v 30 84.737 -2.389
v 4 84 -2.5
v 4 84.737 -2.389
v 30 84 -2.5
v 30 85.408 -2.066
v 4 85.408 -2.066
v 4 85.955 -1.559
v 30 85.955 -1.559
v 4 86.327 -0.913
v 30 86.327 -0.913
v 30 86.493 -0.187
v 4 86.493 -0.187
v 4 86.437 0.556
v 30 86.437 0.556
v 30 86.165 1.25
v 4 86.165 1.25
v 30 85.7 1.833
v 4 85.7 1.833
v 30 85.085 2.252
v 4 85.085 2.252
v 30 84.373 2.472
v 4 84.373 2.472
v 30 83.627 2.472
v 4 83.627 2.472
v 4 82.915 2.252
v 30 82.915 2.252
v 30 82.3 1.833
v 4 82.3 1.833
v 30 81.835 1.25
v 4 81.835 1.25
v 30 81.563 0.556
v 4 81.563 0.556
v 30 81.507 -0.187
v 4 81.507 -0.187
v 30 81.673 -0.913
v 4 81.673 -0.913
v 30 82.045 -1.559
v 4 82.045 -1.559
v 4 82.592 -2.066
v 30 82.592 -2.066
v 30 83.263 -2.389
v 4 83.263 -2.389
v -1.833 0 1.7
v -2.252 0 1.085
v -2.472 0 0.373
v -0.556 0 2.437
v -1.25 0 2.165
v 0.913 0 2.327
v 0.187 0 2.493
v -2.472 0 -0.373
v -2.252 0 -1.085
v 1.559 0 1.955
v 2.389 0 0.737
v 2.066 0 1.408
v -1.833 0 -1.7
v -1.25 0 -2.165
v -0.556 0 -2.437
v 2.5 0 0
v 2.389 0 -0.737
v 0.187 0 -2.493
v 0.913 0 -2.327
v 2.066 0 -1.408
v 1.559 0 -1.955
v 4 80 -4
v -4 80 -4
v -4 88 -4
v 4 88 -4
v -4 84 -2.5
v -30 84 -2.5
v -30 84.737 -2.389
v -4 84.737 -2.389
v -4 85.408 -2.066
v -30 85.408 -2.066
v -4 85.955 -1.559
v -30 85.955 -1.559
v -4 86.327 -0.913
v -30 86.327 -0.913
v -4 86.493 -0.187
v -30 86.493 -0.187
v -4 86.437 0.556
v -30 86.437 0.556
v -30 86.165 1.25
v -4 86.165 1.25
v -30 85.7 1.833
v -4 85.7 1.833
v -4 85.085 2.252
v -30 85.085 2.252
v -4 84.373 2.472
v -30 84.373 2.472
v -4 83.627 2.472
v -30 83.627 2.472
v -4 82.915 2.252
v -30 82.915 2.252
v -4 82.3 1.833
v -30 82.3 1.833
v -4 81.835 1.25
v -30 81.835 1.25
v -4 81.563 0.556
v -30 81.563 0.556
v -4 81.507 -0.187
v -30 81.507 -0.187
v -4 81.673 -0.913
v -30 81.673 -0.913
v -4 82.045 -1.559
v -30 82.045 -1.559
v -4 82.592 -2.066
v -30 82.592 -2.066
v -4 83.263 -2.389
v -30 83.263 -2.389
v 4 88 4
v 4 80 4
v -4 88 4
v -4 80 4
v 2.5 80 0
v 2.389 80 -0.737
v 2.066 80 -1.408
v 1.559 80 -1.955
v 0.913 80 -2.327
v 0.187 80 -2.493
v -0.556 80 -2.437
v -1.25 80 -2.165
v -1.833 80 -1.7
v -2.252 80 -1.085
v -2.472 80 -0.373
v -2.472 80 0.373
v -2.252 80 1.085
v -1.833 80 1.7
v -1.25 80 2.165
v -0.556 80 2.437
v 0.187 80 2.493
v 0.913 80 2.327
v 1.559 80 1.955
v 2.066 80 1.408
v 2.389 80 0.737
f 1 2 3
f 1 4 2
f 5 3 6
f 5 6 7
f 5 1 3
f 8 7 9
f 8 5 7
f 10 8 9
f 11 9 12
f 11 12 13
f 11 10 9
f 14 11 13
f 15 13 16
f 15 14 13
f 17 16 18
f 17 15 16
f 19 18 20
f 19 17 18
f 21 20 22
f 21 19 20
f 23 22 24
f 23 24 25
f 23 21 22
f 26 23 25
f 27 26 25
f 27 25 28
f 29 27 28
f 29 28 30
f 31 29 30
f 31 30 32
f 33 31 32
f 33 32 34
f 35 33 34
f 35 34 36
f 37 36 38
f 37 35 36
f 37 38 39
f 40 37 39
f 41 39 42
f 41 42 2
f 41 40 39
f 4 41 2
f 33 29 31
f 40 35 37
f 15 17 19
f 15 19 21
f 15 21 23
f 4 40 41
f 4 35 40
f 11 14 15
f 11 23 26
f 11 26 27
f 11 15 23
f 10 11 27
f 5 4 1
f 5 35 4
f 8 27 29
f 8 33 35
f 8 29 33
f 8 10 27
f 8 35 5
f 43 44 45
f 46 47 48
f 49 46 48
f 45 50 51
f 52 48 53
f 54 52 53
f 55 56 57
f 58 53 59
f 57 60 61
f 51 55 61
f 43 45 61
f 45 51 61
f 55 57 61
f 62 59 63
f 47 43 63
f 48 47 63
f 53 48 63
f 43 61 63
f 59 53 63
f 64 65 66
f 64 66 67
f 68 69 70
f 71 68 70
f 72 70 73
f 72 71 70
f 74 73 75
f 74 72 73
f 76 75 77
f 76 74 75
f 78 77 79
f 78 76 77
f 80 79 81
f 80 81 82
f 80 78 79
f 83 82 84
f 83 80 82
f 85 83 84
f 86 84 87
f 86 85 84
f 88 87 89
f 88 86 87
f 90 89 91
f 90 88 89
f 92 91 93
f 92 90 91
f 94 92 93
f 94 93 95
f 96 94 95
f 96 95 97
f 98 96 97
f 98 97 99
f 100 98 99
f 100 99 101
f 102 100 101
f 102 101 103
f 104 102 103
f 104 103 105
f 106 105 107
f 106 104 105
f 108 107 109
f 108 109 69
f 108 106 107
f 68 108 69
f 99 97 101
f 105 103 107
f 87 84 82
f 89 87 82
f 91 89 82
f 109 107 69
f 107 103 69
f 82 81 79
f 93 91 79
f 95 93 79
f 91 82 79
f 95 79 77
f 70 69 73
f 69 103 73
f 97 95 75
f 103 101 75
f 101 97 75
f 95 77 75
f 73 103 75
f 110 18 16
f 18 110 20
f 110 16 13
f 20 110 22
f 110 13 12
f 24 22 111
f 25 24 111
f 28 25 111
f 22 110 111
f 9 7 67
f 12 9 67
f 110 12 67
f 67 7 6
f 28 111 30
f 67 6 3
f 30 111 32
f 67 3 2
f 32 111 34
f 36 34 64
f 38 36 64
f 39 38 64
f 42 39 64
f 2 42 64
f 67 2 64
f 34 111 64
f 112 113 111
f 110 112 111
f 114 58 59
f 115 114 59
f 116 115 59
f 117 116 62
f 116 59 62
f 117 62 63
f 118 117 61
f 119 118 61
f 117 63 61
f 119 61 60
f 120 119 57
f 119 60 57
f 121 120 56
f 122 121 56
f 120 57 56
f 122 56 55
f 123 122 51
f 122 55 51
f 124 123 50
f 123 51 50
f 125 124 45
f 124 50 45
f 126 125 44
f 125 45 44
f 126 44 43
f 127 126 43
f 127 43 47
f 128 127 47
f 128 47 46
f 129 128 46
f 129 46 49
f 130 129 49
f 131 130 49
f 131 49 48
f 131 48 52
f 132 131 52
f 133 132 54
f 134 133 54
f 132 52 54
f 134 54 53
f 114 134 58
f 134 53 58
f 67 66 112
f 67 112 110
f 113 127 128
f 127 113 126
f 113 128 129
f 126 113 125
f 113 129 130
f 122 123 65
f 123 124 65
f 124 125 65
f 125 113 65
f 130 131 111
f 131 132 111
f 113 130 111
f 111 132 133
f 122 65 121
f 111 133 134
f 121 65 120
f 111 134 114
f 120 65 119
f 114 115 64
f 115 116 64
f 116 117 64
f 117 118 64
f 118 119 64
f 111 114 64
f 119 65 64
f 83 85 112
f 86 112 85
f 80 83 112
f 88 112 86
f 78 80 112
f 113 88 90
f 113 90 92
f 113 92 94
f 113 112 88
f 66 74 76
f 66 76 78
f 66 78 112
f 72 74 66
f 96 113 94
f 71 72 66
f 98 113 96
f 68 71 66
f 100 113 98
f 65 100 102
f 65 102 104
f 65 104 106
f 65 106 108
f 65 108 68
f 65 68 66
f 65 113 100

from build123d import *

# Parameters (mm, degrees)
SKETCH1_R           = 2.5
BOSS_EXTRUDE1_DEPTH = 80
SKETCH2_W           = 8
SKETCH2_H           = 8
BOSS_EXTRUDE2_DEPTH = 8
SKETCH3_R           = 2.5
BOSS_EXTRUDE3_DEPTH = 30


with BuildPart() as part:
    # Sketch1 → Boss-Extrude1 (new body)
    with BuildSketch(Plane(origin=(0, 0, 0), x_dir=(1, 0, 0), z_dir=(0, 1, 0))):
        Circle(SKETCH1_R)
    extrude(amount=BOSS_EXTRUDE1_DEPTH)

    # Sketch2 → Boss-Extrude2 (add)
    with BuildSketch(Plane(origin=(0, 80, 0), x_dir=(1, 0, 0), z_dir=(0, 1, 0))):
        Rectangle(SKETCH2_W, SKETCH2_H)
    extrude(amount=BOSS_EXTRUDE2_DEPTH)

    # Sketch3 → Boss-Extrude3 (add, symmetric)
    with BuildSketch(Plane(origin=(0, 0, 0), x_dir=(0, 0, -1), z_dir=(1, 0, 0))):
        with Locations((0, 84)):
            Circle(SKETCH3_R)
    extrude(amount=BOSS_EXTRUDE3_DEPTH, both=True)


solid = part.part
